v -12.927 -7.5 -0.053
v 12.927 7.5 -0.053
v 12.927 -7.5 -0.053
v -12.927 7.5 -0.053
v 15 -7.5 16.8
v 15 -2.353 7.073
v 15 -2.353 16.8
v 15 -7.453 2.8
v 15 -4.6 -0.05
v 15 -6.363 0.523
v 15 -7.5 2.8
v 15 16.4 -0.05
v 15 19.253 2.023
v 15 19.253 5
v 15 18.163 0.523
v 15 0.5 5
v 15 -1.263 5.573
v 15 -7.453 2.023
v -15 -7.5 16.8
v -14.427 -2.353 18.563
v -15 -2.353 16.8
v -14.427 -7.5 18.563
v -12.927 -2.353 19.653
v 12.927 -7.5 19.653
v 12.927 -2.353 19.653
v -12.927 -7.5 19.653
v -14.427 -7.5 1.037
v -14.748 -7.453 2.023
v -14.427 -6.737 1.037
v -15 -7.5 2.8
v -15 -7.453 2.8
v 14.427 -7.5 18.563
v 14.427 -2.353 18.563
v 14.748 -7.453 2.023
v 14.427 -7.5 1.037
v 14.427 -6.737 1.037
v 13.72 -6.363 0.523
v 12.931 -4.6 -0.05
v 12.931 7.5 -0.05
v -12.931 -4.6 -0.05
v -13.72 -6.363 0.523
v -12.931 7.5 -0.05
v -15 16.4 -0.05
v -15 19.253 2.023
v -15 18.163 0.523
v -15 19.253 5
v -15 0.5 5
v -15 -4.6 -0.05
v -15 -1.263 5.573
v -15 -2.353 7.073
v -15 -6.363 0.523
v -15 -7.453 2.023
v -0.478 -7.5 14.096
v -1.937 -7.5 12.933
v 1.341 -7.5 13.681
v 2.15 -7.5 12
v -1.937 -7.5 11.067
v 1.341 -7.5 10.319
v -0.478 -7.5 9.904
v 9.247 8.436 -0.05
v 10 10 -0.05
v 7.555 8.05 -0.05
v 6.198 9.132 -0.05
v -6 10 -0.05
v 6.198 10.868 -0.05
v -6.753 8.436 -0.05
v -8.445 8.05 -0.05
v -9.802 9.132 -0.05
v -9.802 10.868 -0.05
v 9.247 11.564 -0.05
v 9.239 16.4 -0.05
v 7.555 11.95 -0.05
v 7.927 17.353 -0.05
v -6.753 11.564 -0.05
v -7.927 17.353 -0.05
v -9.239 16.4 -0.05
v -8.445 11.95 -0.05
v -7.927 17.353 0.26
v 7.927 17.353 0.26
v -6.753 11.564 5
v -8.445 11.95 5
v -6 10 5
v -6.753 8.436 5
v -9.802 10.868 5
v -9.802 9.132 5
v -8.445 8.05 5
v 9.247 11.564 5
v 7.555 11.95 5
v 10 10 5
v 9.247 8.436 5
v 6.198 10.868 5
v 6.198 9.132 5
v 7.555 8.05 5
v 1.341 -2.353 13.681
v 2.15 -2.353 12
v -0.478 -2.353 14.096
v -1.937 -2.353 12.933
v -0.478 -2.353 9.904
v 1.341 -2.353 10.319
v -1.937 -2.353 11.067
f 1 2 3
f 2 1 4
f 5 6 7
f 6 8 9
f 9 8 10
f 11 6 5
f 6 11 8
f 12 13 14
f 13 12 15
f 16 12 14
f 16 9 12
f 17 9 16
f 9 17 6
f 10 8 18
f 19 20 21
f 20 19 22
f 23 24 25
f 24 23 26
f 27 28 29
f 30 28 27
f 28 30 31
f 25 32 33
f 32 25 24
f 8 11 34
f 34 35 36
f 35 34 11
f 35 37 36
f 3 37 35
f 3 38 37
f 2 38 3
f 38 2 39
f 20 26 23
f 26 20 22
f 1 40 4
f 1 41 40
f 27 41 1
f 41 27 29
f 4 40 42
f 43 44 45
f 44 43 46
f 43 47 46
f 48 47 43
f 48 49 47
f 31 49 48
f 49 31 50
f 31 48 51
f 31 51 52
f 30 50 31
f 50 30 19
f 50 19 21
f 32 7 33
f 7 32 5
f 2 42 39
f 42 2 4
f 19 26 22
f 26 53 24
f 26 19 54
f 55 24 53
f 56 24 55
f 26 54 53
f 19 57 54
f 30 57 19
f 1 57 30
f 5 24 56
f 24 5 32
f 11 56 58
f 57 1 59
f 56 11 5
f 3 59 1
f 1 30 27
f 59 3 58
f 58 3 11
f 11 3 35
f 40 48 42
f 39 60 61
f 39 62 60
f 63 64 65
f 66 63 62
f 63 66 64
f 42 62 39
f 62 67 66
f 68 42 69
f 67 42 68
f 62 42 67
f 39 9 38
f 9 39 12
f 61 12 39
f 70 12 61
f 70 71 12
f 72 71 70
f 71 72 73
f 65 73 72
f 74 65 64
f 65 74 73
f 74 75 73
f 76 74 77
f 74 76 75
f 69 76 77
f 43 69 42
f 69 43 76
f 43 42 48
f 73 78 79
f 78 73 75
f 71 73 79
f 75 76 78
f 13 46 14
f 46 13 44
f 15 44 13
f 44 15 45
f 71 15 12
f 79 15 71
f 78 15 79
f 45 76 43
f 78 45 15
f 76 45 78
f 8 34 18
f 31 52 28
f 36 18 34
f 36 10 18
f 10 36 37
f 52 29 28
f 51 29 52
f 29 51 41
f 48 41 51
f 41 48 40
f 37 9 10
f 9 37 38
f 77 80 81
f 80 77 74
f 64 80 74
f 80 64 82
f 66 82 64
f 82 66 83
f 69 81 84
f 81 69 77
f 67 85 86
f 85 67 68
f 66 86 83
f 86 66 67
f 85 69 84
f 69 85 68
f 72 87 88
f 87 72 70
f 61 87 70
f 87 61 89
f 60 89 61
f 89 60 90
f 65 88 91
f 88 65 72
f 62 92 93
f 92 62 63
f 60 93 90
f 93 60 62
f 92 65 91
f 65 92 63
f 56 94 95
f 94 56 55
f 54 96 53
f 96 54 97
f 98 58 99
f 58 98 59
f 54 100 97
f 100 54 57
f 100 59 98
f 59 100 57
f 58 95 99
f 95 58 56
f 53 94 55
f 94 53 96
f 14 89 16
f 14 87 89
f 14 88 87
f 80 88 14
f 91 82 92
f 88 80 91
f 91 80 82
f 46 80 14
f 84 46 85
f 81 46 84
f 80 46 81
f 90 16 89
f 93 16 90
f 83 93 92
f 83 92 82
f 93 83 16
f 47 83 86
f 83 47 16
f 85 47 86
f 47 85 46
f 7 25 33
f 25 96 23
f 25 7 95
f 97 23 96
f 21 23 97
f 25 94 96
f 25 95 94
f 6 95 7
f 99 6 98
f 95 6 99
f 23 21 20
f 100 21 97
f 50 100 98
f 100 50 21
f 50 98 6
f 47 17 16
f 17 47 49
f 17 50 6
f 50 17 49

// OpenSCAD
difference() {
union()
{
translate([0,0,9.8])
rotate([90,0,0])roundcube([30,20,15],center=true);
translate([0,(25-15)/2,15/2-0.05])
rotate([0,0,0])roundcube([20,25,15],center=true);
translate([0,5.9,15/2-0.05])
rotate([0,90,0])roundcube([15,27,30],center=true);
}
#translate([0,0,14-2]) rotate([90,0,0]) cylinder(d=4.3, h =20);
for (i = [-8, 8])
#translate([i,10,0]) cylinder(d=4, h =20,center=true);
#translate([0,(25-15)/2+5,35/2+5])rotate([0,90,0])roundcube([35,25,45],center=true);
}
use<inc/functions.scad>
